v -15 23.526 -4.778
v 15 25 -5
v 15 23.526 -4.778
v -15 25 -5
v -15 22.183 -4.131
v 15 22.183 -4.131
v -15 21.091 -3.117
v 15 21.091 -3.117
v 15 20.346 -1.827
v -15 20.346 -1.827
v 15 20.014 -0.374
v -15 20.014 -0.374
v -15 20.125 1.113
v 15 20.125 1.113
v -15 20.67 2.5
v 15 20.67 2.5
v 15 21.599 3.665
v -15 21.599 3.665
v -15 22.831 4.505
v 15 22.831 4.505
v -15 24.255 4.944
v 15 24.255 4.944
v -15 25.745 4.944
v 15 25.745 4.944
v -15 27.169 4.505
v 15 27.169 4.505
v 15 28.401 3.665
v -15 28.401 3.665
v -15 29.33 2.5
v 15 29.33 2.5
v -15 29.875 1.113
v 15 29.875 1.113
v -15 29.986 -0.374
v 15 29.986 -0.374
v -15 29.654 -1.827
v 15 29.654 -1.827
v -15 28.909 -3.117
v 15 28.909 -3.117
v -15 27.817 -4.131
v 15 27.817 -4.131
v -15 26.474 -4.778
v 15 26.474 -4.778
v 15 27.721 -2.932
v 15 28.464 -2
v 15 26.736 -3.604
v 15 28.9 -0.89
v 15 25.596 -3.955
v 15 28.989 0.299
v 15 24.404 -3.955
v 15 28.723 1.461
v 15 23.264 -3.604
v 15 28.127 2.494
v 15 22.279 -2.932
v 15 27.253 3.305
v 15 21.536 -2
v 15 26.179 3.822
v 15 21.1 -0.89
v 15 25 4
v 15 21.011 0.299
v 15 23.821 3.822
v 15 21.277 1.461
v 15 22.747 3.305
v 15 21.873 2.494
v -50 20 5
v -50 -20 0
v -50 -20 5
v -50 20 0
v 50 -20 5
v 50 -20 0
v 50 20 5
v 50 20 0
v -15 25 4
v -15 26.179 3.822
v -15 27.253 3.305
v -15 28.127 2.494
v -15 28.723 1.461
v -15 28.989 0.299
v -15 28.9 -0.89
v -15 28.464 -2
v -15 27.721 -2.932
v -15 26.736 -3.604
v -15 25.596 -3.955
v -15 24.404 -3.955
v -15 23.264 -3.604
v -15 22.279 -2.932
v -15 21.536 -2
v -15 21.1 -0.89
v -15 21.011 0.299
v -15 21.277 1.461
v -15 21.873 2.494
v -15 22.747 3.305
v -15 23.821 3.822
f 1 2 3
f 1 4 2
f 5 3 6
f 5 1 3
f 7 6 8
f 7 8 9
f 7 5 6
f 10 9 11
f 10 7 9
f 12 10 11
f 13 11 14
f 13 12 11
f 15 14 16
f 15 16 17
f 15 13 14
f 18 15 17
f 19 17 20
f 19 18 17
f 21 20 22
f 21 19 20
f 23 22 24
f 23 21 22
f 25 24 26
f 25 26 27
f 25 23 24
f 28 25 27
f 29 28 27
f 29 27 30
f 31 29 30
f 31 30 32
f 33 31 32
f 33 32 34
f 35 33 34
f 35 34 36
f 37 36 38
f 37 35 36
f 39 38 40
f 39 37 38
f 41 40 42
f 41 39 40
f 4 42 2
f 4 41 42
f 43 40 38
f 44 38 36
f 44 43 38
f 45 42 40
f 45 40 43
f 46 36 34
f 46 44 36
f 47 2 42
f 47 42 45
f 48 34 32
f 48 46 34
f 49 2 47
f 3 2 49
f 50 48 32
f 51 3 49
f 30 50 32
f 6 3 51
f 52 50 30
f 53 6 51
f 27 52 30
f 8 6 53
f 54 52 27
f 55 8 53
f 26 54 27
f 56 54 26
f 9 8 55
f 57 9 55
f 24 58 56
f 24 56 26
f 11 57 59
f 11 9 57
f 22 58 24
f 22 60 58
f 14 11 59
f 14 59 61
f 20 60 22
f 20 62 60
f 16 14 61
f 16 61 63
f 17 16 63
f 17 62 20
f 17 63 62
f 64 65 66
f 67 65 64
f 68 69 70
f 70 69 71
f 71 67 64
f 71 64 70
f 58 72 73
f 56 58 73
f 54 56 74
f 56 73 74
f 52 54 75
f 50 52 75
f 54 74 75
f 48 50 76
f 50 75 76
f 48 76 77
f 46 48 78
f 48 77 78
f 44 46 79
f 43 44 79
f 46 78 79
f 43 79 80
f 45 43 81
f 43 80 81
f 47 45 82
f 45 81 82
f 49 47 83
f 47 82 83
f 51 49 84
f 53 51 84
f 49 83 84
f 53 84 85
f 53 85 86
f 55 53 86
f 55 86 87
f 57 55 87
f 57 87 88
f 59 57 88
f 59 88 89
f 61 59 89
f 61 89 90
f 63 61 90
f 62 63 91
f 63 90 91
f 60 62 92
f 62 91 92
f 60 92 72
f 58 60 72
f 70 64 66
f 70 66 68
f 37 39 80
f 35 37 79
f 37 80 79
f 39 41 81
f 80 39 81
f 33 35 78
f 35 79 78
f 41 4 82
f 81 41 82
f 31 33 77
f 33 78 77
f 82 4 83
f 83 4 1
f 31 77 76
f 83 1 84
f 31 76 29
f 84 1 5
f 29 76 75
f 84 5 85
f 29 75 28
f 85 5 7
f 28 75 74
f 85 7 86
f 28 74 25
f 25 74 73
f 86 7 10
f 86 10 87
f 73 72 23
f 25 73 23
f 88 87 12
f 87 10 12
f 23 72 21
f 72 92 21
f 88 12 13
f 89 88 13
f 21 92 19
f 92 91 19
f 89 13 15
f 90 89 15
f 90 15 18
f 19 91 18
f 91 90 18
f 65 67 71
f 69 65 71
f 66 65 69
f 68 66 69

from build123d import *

# Parameters (mm, degrees)
SKETCH1_W           = 100
SKETCH1_H           = 40
BOSS_EXTRUDE1_DEPTH = 5
SKETCH2_W           = 30
SKETCH2_H           = 5
SKETCH3_R           = 4
CUT_EXTRUDE1_DEPTH  = 30


with BuildPart() as part:
    # Sketch1 → Boss-Extrude1 (new body)
    with BuildSketch(Plane.XY):
        Rectangle(SKETCH1_W, SKETCH1_H)
    extrude(amount=BOSS_EXTRUDE1_DEPTH)


with BuildPart() as body_2:
    # Sketch2 → Revolve-Thin1 (revolve)
    with BuildSketch(Plane(origin=(0, 0, 0), x_dir=(-1, 0, 0), z_dir=(0, 0, -1)), mode=Mode.PRIVATE) as revolve_thin1_sk:
        with Locations((0, 27.5)):
            Rectangle(SKETCH2_W, SKETCH2_H)
    revolve(revolve_thin1_sk.sketch.rotate(Axis((15, 25, 0), (-1, 0, 0)), 90), axis=Axis((15, 25, 0), (-1, 0, 0)))

    # Sketch3 → Cut-Extrude1 (cut)
    with BuildSketch(Plane.ZY.offset(15)):
        with Locations((0, 25)):
            Circle(SKETCH3_R)
    extrude(amount=-CUT_EXTRUDE1_DEPTH, mode=Mode.SUBTRACT)


solid = Compound([part.part, body_2.part])
